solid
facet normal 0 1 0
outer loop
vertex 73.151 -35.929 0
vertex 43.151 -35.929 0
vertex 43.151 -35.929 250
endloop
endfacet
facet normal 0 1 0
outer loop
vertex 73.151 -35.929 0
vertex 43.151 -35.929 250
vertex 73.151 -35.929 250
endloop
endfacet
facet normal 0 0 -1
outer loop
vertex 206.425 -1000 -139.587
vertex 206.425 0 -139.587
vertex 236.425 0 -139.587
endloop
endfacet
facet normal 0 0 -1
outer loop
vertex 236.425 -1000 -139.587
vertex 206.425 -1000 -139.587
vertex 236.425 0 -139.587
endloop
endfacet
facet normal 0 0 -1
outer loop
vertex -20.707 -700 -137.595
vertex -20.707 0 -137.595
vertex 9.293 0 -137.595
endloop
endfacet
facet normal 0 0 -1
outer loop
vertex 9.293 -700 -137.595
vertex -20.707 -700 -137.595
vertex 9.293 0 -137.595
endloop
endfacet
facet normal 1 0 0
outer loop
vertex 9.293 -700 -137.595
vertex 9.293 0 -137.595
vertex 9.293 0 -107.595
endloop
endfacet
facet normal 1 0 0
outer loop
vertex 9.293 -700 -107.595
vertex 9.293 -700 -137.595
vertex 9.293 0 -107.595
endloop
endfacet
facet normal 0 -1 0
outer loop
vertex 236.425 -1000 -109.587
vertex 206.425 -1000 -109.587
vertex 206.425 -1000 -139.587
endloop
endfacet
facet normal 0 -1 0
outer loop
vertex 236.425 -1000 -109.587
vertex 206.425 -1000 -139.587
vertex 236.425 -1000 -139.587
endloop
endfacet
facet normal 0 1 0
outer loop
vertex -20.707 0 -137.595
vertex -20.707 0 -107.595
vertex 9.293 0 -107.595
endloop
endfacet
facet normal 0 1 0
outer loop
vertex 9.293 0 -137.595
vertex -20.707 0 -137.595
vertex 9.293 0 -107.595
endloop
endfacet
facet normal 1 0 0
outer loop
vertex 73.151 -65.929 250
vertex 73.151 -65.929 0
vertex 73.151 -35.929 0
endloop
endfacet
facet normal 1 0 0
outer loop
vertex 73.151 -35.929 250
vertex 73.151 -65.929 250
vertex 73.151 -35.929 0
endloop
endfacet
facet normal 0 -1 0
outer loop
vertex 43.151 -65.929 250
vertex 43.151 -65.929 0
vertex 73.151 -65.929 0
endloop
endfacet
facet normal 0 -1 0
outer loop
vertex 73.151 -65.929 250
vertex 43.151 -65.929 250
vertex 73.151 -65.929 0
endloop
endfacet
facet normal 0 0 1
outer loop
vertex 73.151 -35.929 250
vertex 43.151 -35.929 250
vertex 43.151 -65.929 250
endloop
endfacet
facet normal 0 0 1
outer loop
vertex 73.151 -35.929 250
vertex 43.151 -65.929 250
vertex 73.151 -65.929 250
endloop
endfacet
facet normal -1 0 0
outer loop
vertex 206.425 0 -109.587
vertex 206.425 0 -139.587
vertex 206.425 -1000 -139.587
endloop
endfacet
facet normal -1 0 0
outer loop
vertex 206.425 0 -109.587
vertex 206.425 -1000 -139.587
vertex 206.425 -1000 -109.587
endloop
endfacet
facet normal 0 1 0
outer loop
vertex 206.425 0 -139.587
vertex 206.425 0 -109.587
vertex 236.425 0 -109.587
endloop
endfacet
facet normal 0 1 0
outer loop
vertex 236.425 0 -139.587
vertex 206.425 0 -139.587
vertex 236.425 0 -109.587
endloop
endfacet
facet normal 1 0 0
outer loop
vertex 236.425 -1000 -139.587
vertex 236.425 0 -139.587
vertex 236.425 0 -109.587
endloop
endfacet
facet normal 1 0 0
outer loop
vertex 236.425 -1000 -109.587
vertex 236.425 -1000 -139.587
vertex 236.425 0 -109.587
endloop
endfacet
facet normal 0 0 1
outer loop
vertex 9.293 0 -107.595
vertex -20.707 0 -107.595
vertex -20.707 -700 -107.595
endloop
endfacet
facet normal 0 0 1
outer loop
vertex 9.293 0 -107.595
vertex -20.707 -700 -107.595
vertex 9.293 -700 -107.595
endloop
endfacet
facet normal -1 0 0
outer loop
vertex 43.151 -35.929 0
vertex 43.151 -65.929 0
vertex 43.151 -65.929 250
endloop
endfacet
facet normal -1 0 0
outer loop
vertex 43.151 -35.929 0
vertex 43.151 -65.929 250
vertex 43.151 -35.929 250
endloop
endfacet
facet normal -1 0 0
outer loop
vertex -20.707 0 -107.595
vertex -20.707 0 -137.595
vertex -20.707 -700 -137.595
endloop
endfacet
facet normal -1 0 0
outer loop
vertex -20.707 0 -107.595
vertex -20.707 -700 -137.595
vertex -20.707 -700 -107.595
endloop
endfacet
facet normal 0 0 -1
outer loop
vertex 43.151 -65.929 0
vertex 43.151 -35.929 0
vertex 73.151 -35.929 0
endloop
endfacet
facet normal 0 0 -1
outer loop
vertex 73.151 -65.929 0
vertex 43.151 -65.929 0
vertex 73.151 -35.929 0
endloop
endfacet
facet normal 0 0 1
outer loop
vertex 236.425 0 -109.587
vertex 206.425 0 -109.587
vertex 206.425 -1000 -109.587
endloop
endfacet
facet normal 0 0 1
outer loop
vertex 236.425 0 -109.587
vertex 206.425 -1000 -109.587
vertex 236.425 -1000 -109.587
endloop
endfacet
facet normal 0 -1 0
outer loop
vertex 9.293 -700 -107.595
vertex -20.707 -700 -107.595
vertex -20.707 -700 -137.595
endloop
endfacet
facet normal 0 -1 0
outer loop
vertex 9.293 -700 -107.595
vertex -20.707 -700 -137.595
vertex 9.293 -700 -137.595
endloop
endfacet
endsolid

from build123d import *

# Parameters (mm, degrees)
F0_W     = 30
F0_H     = 30
F1_DEPTH = 250
F2_W     = 30
F2_H     = 30
F3_DEPTH = 1000
F4_DEPTH = 700


with BuildPart() as f1:
    # F0 (on Top) → F1 (new body)
    with BuildSketch(Plane.XY):
        with Locations((58.1509166956, -50.9285262227)):
            Rectangle(F0_W, F0_H)
    extrude(amount=F1_DEPTH)


with BuildPart() as f3:
    # F2 (on Front) → F3 (new body)
    with BuildSketch(Plane.XZ):
        with Locations((221.4248037338, -124.5870149136)):
            Rectangle(F2_W, F2_H)
    extrude(amount=F3_DEPTH)


with BuildPart() as f4:
    # F2 (on Front) → F4 (new body)
    with BuildSketch(Plane.XZ):
        with Locations((-5.7069445029, -122.5953102112)):
            Rectangle(F2_W, F2_H)
    extrude(amount=F4_DEPTH)


solid = Compound([f1.part, f3.part, f4.part])
